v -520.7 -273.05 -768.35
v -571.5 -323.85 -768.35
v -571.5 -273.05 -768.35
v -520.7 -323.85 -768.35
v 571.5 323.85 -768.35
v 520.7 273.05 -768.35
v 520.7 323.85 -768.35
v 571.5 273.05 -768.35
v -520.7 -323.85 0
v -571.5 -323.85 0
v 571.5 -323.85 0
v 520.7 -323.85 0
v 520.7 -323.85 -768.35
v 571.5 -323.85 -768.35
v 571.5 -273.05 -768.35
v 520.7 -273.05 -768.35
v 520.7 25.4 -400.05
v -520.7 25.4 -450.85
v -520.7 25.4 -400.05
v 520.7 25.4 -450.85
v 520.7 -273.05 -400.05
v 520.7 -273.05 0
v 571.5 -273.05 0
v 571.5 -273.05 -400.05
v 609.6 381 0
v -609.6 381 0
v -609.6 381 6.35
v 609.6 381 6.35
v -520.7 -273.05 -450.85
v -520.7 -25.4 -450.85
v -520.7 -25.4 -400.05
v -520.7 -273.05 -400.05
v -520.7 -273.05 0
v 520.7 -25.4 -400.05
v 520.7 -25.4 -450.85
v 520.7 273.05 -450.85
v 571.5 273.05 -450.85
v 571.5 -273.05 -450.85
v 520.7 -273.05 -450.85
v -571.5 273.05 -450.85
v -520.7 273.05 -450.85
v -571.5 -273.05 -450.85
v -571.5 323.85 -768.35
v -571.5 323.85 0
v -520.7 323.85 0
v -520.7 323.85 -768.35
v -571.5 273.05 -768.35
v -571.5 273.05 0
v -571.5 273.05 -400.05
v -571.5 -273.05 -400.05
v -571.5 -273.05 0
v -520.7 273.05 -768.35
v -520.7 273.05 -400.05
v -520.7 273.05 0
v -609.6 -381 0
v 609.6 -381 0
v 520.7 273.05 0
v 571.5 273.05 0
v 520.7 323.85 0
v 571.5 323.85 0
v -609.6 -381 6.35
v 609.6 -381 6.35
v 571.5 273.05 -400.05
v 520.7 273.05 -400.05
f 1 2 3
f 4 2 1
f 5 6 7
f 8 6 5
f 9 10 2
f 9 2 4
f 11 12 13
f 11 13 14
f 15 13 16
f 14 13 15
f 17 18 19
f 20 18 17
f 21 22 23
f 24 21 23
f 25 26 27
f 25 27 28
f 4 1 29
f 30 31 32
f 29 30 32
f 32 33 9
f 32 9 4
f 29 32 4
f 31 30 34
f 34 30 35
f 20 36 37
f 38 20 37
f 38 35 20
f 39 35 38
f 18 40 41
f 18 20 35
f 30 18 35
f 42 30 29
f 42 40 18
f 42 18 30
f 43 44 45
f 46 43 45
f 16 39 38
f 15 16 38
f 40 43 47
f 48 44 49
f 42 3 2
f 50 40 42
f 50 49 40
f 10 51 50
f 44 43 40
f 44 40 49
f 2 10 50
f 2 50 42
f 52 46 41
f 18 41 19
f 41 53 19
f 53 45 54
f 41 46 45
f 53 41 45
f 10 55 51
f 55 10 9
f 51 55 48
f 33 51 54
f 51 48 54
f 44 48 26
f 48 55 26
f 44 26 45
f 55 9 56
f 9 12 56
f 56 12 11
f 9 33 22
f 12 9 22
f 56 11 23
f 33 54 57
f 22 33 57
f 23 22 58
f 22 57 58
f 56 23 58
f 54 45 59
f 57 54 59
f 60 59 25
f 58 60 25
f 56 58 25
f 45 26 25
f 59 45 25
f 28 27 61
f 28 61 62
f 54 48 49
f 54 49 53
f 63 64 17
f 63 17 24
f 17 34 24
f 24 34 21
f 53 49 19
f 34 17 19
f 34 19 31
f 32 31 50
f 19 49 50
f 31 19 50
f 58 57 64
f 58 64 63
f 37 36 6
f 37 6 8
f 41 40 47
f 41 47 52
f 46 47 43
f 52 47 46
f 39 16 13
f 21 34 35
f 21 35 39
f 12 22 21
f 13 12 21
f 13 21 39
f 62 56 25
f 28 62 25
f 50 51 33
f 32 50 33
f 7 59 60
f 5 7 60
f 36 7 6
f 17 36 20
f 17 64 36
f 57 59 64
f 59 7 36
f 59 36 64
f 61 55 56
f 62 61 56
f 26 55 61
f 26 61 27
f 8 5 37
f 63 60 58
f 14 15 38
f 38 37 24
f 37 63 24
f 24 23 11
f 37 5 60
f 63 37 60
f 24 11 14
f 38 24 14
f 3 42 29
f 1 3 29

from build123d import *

# Parameters (mm, degrees)
F0_W     = 1219.2
F0_H     = 762
F1_DEPTH = 6.35
F2_W     = 50.8
F2_H     = 50.8
F3_DEPTH = 768.35
F4_W     = 546.1
F4_H     = 50.8
F5_DEPTH = 50.8
F7_W     = 1041.4
F7_H     = 50.8
F8_DEPTH = 50.8


with BuildPart() as f1:
    # F0 (on Top) → F1 (new body)
    with BuildSketch(Plane.XY):
        Rectangle(F0_W, F0_H)
    extrude(amount=F1_DEPTH)

    # F2 (on face) → F3 (join)
    with BuildSketch(Plane(origin=(0, 0, 0), x_dir=(1, 0, 0), z_dir=(0, 0, -1))):
        with Locations((546.1, -298.45)):
            Rectangle(F2_W, F2_H)
        with Locations((-546.1, -298.45)):
            Rectangle(F2_W, F2_H)
        with Locations((546.1, 298.45)):
            Rectangle(F2_W, F2_H)
        with Locations((-546.1, 298.45)):
            Rectangle(F2_W, F2_H)
    extrude(amount=F3_DEPTH)

    # F4 (on face) → F5 (join)
    with BuildSketch(Plane(origin=(-571.5, 0, 0), x_dir=(0, -1, 0), z_dir=(-1, 0, 0))):
        with Locations((0, -425.45)):
            Rectangle(F4_W, F4_H)
    extrude(amount=-F5_DEPTH)

    # F6: F1 across plane


with BuildPart() as f1_1:
    add(f1.part)
    add(f1.part.mirror(Plane.YZ))

    # F7 (on face) → F8 (join, through all)
    with BuildSketch(Plane(origin=(0, 0, -450.85), x_dir=(1, 0, 0), z_dir=(0, 0, -1))):
        Rectangle(F7_W, F7_H)
    extrude(amount=-F8_DEPTH)


solid = f1_1.part
